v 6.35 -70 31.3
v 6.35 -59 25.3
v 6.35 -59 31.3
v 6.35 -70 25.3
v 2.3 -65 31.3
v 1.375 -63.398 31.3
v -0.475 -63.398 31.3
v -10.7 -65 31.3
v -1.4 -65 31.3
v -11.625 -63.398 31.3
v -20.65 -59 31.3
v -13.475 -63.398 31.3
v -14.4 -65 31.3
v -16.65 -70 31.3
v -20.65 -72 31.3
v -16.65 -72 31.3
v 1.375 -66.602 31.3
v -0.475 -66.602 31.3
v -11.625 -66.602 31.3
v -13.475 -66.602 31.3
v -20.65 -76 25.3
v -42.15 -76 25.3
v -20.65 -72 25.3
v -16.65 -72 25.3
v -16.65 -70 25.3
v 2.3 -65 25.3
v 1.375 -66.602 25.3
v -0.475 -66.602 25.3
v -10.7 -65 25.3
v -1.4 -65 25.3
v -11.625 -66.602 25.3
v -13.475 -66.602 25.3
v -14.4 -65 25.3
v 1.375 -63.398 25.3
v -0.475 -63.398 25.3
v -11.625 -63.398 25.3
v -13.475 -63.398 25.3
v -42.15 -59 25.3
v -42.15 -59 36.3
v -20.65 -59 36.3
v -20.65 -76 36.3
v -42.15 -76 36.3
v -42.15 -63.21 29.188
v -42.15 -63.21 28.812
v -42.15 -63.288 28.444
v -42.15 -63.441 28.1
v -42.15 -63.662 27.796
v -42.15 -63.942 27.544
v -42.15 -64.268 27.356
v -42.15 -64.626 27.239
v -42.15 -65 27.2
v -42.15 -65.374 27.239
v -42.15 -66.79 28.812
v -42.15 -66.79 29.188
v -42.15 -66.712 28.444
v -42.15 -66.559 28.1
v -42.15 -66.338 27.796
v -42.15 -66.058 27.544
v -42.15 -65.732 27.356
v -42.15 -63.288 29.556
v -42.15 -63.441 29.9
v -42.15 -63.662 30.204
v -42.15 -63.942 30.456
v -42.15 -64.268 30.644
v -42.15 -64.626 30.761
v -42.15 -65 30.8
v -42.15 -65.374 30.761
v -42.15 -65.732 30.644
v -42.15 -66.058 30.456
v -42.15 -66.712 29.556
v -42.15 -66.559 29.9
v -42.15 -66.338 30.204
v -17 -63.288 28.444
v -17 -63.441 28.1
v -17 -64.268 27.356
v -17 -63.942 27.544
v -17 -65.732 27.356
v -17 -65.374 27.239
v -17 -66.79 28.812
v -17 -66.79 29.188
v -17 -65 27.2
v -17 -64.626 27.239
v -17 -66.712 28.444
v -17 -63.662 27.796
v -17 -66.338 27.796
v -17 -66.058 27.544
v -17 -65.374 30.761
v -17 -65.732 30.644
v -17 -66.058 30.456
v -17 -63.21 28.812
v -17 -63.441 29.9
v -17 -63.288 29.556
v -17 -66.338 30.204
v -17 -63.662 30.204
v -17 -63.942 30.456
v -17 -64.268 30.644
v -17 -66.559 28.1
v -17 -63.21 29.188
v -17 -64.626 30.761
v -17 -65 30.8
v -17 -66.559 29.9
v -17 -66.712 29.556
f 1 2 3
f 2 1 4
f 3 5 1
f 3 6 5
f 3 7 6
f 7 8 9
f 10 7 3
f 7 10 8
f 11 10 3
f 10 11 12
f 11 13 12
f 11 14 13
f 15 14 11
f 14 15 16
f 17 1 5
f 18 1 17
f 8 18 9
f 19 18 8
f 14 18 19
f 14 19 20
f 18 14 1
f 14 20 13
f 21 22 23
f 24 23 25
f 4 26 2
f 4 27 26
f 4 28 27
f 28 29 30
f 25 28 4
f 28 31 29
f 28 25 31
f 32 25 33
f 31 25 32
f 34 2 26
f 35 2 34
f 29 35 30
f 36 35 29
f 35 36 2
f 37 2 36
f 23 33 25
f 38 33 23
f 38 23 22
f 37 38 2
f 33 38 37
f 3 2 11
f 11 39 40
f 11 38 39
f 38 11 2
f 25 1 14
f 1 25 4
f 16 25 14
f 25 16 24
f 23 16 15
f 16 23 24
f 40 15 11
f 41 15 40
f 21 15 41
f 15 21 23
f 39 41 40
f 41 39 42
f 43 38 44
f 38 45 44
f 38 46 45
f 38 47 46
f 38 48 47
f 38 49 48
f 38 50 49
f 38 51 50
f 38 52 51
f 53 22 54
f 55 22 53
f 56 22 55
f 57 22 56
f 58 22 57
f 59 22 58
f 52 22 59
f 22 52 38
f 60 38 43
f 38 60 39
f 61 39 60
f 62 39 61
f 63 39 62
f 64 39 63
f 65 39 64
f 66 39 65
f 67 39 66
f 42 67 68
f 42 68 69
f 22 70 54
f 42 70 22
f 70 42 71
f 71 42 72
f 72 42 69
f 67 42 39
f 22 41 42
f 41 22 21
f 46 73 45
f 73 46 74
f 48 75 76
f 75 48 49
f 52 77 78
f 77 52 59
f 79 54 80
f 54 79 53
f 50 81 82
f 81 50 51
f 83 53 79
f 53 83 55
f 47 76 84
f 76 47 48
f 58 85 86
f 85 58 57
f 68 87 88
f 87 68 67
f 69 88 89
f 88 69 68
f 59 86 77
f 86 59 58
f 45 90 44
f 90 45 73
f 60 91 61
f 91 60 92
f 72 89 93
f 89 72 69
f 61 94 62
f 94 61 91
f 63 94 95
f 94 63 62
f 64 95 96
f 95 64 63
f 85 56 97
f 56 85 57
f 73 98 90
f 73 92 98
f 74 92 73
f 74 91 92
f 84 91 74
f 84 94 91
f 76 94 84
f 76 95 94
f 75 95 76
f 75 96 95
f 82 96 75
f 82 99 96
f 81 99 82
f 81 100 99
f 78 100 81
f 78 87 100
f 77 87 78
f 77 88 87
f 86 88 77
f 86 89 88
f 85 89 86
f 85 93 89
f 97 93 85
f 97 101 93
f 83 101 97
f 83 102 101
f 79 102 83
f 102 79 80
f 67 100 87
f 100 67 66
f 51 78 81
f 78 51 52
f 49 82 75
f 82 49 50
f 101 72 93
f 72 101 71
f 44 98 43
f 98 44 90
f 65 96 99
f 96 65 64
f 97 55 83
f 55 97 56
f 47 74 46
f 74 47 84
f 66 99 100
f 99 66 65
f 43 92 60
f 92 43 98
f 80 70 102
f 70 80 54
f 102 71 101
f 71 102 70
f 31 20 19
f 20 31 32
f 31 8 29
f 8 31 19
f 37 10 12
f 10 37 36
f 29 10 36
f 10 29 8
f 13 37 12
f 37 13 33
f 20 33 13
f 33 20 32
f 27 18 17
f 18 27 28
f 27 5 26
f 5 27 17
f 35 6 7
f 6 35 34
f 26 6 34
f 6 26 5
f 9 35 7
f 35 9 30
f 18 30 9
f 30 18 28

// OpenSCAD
//translate([-40+2,-25+18.8,3])import("/Users/richard/Documents/009Reprapcatcube010715/igus_sliders/TS_04_09_50_3.stl");

stepper_linear_m8nut_endstopflag(6);

/*

difference(){
translate([49.7,31,25])slider_wall_mod();
 translate([-6.5,-20,20]){translate([0,0,4.5])cylinder(r=3.7/2,h=30);translate([0,0,-20])cylinder(r=2.7/2,h=40);}
  translate([-6.5,17,20]){translate([0,0,4.5])cylinder(r=3.7/2,h=30);translate([0,0,-20])cylinder(r=2.7/2,h=40);}
  translate([-6.5,36,20]){translate([0,0,4.5])cylinder(r=3.7/2,h=30);translate([0,0,-20])cylinder(r=2.7/2,h=40);}
  translate([35,0,0]){
  translate([-6.5,-20,20]){translate([0,0,4.5])cylinder(r=3.7/2,h=30);translate([0,0,-20])cylinder(r=2.7/2,h=40);}
  translate([-6.5,17,20]){translate([0,0,4.5])cylinder(r=3.7/2,h=30);translate([0,0,-20])cylinder(r=2.7/2,h=40);}
  translate([-6.5,36,20]){translate([0,0,4.5])cylinder(r=3.7/2,h=30);translate([0,0,-20])cylinder(r=2.7/2,h=40);}
}
}
*/

module stepper_linear_m8nut_endstopflag(thick){
translate([0,-20-9,0])difference(){
difference(){union(){
translate([-38.25+14-13.9+20,-70+30.-5+4,22.5+3.8-1.0])cube([44.5-20,11,thick]);
translate([-38.25+14-13.9+20-20,-70+30.-5-5+7,22.5+3.8-1.0])#cube([44.5-20+20-23,5+10+5-7,thick]);
translate([-38.25+14-13.9+20-20-4,-70+30.-5-5-4+7,22.5+3.8-1.0])cube([44.5-20+20-23,5+10+5+4-7,thick+5]);
}
translate([-90,-40+4,29])rotate([0,90,0])#cylinder(r=3.6/2,h=73,$fn=30);
}
for(i=[0:0]){
translate([-38.25+14-13.9+13.7+11.9-i,-70+34,22.5+3.8-50])cylinder(r=3.7/2,h=120);
translate([-38.25+14-13.9+13.7+13+11.9-i,-70+34,22.5+3.8-50])cylinder(r=3.7/2,h=120);
}
}
}





module slider_wall_mod(){
translate([-90,0+10,-0.5])difference(){
union(){
translate([0-7.5-10-32+56+3,-40+20+10+3-8+22+3,0])#cube([10+15+10+10+32-48,10,6+3-5+14]);
translate([0-7.5-10-32+56+3+14+5,-40+20+10+3-8+22+3-10,0])#cube([10+15+10+10+32-48-15,10,6+3-5+14-8]);
}
translate([13,-36+(0*10)+48+3,0]){cylinder(r=2.8/2,h=1000);}
translate([13+19,-36+(0*10)+48+3,0]){cylinder(r=2.8/2,h=1000);}
}
difference(){
union(){
translate([25-47.5,17.32+1.38-14-87,-13.5+13]){
translate([-2,-35+25,0])cube([4.64+2,13.62+1+22+58.5+35-25,10]);
translate([-2-35,-35+25,0])cube([4.64+2,13.62+1+22+55+37-25,10]);
translate([-2-35,4-40+25-4,0])cube([4.64+2+35,10,10]);
translate([-2-35,85,0])cube([4.64+2+30,10,10]);
}
}
translate([25-47.5-16.5-0.20+0.5,17.32+1.38-14-117-0.65+21+(20*5)-(20*5),-13.5+13-20])#cylinder(r=1.4/2,h=200,$fn=30);
translate([25-47.5-16.5-0.20+0.5,17.32+1.38-14-117-0.65+21+(20*5),-13.5+13-20])#cylinder(r=1.4/2,h=200,$fn=30);
translate([25-47.5-16.5-0.20+0.5,17.32+1.38-14-117-0.65+120+20,-13.5+13-20+18])rotate([90,0,0])cylinder(r=12/2,h=40);
translate([25-47.5-16.5-0.20+1,17.32+1.38-14-117-0.65+120+20,-13.5+13-20+18])rotate([90,0,0])cylinder(r=12/2,h=40);
translate([25-47.5-16.5-0.20,17.32+1.38-14-117-0.65+120+20,-13.5+13-20+18])rotate([90,0,0])cylinder(r=12/2,h=40);
}
}
